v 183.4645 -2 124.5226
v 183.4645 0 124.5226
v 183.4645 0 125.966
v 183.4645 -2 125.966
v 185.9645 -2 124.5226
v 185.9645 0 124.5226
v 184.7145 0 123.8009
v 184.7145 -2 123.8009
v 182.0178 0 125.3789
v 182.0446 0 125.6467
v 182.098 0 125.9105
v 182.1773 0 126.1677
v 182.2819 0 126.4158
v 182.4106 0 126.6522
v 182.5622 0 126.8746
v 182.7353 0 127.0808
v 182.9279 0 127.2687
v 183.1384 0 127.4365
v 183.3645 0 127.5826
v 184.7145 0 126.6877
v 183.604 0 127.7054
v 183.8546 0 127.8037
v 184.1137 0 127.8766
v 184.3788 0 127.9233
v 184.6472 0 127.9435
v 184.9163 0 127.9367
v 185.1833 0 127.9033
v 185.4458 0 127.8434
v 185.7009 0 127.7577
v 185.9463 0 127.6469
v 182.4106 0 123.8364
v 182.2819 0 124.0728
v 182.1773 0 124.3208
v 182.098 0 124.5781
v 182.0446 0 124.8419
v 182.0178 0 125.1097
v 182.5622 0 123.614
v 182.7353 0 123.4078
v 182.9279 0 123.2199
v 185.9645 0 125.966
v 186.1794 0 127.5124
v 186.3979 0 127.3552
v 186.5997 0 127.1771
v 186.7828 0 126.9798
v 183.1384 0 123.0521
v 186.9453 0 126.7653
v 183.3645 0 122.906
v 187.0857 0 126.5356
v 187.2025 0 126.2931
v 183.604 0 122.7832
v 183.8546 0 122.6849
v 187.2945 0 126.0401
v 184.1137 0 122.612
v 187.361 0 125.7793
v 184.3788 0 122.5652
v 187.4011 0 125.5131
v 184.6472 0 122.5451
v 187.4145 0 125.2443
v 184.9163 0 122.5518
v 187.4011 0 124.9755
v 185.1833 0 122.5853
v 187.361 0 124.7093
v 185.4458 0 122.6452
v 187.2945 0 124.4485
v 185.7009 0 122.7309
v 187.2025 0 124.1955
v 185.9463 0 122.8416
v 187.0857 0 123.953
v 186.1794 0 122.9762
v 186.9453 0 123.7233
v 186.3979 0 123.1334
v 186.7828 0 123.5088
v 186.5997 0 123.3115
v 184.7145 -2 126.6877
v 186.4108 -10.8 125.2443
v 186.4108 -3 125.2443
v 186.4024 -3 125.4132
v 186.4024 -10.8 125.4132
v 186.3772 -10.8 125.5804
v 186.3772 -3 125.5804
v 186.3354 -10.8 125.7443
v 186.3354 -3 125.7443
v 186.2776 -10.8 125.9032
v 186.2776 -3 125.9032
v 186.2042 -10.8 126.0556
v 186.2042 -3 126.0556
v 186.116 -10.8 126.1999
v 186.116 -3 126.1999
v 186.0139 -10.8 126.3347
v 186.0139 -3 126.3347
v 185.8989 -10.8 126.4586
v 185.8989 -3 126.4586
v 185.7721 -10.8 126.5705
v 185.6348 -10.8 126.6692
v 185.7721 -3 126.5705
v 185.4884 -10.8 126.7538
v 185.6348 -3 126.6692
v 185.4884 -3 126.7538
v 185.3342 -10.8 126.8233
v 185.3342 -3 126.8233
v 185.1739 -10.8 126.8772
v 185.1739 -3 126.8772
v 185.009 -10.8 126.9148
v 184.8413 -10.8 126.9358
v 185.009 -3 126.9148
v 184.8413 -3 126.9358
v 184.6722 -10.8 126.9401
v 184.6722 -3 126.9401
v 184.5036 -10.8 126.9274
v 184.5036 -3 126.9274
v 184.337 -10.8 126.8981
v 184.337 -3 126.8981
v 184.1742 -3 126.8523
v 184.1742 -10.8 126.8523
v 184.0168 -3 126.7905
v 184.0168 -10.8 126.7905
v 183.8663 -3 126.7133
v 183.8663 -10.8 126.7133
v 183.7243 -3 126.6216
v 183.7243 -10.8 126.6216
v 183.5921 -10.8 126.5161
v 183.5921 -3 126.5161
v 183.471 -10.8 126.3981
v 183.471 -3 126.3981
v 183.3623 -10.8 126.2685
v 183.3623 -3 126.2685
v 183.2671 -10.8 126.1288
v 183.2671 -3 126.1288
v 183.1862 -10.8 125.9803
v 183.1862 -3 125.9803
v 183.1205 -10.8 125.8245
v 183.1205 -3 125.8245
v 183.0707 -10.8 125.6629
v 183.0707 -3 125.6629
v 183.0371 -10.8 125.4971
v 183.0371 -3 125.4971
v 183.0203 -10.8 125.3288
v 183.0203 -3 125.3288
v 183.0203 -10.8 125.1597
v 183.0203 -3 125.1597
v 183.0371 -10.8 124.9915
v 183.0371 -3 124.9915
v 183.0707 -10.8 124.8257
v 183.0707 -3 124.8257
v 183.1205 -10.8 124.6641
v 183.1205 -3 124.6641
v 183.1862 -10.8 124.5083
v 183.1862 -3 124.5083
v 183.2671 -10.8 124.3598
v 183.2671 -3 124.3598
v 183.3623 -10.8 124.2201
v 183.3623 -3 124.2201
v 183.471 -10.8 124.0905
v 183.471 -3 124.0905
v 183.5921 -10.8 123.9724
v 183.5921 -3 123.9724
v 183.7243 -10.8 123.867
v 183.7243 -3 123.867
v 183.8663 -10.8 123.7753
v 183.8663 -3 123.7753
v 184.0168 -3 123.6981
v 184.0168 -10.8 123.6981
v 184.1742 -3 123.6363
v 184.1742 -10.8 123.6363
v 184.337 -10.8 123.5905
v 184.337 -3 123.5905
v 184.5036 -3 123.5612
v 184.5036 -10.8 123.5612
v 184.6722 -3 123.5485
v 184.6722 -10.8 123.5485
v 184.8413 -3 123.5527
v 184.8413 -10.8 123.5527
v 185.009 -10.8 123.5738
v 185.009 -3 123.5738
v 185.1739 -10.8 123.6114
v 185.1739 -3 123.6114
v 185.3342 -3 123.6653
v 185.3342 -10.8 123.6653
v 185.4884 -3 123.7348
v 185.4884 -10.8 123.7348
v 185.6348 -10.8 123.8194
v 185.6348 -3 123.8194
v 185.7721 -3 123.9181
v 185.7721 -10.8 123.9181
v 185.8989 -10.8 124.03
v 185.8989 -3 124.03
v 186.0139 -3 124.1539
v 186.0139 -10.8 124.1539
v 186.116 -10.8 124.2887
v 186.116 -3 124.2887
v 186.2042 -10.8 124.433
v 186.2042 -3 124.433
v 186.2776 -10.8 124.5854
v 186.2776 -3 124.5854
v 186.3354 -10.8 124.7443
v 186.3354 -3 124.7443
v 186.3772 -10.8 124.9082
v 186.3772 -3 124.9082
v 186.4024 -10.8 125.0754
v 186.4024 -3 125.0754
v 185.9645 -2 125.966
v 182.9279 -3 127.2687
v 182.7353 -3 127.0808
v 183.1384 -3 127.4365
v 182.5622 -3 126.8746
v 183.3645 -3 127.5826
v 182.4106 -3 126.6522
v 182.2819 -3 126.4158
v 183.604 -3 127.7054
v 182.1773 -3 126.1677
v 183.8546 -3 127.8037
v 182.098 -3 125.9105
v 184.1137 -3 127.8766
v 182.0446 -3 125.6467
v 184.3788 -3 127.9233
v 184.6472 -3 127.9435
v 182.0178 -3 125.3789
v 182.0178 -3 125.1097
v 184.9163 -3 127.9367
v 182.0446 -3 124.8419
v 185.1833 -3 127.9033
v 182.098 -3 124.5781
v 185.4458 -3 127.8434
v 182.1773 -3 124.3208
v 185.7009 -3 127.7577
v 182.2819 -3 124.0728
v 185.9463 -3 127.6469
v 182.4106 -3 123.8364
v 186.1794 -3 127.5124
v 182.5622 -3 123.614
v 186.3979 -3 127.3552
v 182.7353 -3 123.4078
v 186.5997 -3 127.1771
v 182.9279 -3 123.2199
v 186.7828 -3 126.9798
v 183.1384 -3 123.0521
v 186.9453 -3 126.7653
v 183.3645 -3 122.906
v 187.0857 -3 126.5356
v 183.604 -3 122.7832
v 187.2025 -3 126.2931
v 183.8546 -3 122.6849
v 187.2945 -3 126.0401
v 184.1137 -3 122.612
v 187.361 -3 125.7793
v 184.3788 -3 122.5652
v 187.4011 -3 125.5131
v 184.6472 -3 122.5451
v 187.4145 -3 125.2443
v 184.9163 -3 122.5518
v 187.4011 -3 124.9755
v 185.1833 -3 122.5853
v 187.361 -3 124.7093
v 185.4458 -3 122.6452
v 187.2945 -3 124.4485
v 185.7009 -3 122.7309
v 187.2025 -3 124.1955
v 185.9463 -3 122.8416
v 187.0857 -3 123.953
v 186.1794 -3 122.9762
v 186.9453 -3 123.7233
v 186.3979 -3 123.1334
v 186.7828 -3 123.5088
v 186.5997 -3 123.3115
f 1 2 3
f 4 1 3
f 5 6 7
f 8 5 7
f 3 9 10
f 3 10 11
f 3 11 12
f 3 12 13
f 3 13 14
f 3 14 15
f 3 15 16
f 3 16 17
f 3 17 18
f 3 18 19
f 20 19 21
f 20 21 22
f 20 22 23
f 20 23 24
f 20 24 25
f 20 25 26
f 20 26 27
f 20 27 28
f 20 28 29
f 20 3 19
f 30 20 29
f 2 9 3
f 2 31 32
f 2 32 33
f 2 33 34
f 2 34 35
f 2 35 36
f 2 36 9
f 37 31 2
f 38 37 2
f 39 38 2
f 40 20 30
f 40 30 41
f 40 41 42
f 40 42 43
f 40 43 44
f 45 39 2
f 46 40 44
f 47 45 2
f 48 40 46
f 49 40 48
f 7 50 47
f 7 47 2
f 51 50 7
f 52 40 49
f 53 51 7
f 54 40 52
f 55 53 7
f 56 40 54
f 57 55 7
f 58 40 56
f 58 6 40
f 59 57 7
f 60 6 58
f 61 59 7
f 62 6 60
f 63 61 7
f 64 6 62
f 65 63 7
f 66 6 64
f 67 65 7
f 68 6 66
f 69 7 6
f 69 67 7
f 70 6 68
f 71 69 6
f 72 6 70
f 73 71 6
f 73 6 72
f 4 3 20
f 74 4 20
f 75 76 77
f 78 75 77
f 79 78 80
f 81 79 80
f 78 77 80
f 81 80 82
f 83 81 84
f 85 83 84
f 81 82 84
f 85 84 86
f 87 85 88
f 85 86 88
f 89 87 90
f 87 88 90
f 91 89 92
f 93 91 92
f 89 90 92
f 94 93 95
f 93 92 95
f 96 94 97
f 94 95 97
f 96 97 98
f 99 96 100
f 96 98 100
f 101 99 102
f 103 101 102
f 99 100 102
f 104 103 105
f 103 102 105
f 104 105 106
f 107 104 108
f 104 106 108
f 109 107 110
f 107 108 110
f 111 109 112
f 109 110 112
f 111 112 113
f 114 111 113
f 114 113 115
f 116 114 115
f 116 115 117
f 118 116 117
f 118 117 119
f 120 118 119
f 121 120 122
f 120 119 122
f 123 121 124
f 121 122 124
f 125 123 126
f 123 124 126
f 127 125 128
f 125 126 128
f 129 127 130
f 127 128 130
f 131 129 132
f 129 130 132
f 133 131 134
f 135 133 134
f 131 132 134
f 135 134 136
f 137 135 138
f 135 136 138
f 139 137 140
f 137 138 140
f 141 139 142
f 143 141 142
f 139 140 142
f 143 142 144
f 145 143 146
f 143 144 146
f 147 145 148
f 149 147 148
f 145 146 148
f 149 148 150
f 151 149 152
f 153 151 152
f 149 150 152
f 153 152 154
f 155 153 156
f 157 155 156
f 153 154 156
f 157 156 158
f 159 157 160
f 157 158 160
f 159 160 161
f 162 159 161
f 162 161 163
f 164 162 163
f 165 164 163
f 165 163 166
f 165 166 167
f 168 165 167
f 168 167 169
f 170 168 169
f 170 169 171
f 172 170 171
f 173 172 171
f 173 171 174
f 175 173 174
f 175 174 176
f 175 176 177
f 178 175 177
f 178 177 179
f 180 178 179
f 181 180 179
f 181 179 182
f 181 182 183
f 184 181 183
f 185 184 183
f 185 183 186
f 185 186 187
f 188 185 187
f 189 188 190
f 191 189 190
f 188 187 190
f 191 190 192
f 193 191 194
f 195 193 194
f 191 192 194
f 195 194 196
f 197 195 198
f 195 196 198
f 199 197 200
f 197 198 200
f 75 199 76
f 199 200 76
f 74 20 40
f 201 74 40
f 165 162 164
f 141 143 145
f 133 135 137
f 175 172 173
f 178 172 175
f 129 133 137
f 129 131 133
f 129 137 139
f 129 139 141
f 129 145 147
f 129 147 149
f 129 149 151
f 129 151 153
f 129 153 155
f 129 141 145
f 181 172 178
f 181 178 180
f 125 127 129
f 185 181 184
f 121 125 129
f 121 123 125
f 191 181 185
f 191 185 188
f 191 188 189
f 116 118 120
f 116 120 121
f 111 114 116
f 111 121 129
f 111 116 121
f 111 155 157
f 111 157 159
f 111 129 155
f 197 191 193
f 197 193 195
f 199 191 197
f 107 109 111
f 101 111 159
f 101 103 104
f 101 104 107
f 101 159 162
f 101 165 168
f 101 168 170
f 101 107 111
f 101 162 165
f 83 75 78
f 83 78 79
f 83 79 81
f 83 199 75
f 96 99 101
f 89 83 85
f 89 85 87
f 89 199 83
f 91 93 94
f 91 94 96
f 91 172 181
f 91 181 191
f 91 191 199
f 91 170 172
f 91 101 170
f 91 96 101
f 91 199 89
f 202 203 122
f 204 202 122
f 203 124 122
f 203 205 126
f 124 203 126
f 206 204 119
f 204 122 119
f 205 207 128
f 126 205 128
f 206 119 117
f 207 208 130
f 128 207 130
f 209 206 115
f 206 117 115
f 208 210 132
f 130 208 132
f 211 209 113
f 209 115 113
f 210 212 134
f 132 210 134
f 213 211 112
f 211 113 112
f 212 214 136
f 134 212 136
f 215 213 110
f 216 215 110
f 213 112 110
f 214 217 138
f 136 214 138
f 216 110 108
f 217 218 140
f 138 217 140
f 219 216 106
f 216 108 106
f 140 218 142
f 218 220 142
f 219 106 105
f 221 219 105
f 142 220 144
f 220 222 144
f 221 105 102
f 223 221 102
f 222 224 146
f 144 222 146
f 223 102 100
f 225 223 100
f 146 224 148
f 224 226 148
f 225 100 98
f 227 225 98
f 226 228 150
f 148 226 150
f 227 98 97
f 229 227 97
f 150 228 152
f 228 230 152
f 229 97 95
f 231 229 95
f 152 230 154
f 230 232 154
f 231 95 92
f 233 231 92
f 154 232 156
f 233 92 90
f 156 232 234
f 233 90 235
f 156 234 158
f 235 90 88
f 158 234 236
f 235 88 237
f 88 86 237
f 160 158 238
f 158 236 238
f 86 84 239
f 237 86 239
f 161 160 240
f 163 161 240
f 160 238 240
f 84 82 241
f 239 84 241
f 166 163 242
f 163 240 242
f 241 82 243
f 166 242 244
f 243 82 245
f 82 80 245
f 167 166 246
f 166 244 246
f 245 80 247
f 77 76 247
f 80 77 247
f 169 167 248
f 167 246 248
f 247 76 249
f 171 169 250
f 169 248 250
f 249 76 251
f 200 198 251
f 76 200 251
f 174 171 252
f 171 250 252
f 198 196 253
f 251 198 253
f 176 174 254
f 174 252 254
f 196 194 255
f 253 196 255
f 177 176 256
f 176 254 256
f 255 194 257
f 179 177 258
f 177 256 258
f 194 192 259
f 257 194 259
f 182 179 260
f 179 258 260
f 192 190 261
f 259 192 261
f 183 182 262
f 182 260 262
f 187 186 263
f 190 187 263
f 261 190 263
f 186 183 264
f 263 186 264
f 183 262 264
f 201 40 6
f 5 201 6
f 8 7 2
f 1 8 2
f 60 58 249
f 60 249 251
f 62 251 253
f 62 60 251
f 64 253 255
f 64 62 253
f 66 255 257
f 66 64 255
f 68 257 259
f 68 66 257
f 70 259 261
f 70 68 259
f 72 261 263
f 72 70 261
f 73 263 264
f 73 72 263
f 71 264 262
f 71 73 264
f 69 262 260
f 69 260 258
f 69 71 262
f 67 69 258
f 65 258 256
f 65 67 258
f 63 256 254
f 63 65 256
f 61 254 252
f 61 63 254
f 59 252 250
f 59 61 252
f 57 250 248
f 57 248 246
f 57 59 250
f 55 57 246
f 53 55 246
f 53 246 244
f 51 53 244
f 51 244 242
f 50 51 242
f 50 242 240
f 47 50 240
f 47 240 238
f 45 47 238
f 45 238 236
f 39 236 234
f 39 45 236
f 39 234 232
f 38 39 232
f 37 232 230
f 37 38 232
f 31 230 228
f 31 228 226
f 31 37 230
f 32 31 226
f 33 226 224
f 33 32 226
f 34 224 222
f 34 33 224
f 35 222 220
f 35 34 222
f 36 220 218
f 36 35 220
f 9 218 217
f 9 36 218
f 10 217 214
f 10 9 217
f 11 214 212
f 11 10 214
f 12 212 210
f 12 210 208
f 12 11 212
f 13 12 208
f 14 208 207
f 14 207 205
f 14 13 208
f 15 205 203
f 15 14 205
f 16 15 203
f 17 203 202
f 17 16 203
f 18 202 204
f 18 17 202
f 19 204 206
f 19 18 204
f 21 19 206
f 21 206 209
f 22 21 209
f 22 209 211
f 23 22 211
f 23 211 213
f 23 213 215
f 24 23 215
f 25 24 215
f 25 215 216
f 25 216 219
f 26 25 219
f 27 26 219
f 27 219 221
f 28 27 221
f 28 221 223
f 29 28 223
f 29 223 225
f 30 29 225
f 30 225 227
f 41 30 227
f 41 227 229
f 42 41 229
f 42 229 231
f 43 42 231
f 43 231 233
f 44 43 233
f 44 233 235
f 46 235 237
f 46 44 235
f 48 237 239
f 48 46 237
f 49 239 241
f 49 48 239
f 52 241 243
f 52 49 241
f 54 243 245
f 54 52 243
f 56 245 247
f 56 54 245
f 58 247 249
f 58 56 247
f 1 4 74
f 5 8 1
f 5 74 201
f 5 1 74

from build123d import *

# Parameters (mm, degrees)
SKETCH1_R           = 2.7
BOSS_EXTRUDE1_DEPTH = 3
SKETCH2_R           = 1.696293742
BOSS_EXTRUDE2_DEPTH = 7.8
CUT_EXTRUDE1_DEPTH  = 2


with BuildPart() as part:
    # Sketch1 → Boss-Extrude1 (new body)
    with BuildSketch(Plane(origin=(0, 0, 0), x_dir=(1, 0, 0), z_dir=(0, 1, 0))):
        with Locations((184.714490272, -125.24429514)):
            Circle(SKETCH1_R)
    extrude(amount=-BOSS_EXTRUDE1_DEPTH)

    # Sketch2 → Boss-Extrude2 (add)
    with BuildSketch(Plane.XZ.offset(3)):
        with Locations((184.714490272, 125.24429514)):
            Circle(SKETCH2_R)
    extrude(amount=BOSS_EXTRUDE2_DEPTH)

    # Sketch3 → Cut-Extrude1 (cut)
    with BuildSketch(Plane(origin=(0, 0, 0), x_dir=(1, 0, 0), z_dir=(0, 1, 0))):
        Polygon((184.714490272, -123.800919467), (183.464490272, -124.522607304), (183.464490272, -125.965982977), (184.714490272, -126.687670813), (185.964490272, -125.965982977), (185.964490272, -124.522607304), align=None)
    extrude(amount=-CUT_EXTRUDE1_DEPTH, mode=Mode.SUBTRACT)


solid = part.part
